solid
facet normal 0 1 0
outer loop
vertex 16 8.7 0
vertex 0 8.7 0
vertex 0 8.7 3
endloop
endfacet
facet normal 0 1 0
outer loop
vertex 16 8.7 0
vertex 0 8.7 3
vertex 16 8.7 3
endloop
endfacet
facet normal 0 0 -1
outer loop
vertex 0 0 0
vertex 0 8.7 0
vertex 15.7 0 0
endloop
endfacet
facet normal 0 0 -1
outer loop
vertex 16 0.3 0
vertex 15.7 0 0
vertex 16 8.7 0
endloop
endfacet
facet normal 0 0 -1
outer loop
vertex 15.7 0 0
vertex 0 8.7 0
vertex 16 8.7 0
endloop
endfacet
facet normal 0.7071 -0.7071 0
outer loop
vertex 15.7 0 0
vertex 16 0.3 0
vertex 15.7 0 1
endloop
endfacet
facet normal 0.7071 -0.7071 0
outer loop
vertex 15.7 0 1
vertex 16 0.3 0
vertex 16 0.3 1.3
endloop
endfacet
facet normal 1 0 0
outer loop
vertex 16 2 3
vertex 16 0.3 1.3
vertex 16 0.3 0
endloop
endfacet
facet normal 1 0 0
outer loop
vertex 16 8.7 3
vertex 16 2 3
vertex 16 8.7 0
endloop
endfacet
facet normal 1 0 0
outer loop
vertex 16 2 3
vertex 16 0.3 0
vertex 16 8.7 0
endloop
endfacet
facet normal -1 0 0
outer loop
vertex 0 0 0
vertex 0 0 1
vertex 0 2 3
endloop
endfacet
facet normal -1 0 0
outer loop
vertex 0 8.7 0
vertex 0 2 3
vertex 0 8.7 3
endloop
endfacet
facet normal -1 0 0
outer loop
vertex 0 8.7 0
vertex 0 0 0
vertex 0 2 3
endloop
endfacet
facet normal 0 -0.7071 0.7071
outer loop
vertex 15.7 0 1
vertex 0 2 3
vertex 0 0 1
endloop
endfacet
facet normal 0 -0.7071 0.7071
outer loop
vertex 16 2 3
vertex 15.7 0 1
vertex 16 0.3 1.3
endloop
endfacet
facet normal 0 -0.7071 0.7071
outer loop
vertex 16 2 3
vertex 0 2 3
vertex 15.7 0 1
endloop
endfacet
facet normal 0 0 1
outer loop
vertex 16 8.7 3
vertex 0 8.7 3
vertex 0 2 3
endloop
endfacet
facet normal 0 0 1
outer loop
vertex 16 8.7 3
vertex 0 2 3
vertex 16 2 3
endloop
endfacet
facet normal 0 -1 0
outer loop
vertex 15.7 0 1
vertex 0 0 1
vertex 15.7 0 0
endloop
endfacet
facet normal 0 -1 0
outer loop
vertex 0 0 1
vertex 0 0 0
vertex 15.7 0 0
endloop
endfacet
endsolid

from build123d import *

# Parameters (mm, degrees)
SKETCH_1_W      = 16
SKETCH_1_H      = 8.7
EXTRUDE_1_DEPTH = 3
CHAMFER_3_SIZE  = 2
CHAMFER_4_SIZE  = 0.3


with BuildPart() as part:
    # Эскиз1 → Вытянуть1 (new body)
    with BuildSketch(Plane.XY):
        with Locations((8, 4.35)):
            Rectangle(SKETCH_1_W, SKETCH_1_H)
    extrude(amount=EXTRUDE_1_DEPTH)

    # Фаска3
    chamfer_3_edges = [part.edges().sort_by_distance(p)[0] for p in [
        (8, 0, 3),
    ]]
    chamfer(chamfer_3_edges, length=CHAMFER_3_SIZE)

    # Фаска4
    chamfer_4_edges = [part.edges().sort_by_distance(p)[0] for p in [
        (16, 0, 0.5),
    ]]
    chamfer(chamfer_4_edges, length=CHAMFER_4_SIZE)


solid = part.part
